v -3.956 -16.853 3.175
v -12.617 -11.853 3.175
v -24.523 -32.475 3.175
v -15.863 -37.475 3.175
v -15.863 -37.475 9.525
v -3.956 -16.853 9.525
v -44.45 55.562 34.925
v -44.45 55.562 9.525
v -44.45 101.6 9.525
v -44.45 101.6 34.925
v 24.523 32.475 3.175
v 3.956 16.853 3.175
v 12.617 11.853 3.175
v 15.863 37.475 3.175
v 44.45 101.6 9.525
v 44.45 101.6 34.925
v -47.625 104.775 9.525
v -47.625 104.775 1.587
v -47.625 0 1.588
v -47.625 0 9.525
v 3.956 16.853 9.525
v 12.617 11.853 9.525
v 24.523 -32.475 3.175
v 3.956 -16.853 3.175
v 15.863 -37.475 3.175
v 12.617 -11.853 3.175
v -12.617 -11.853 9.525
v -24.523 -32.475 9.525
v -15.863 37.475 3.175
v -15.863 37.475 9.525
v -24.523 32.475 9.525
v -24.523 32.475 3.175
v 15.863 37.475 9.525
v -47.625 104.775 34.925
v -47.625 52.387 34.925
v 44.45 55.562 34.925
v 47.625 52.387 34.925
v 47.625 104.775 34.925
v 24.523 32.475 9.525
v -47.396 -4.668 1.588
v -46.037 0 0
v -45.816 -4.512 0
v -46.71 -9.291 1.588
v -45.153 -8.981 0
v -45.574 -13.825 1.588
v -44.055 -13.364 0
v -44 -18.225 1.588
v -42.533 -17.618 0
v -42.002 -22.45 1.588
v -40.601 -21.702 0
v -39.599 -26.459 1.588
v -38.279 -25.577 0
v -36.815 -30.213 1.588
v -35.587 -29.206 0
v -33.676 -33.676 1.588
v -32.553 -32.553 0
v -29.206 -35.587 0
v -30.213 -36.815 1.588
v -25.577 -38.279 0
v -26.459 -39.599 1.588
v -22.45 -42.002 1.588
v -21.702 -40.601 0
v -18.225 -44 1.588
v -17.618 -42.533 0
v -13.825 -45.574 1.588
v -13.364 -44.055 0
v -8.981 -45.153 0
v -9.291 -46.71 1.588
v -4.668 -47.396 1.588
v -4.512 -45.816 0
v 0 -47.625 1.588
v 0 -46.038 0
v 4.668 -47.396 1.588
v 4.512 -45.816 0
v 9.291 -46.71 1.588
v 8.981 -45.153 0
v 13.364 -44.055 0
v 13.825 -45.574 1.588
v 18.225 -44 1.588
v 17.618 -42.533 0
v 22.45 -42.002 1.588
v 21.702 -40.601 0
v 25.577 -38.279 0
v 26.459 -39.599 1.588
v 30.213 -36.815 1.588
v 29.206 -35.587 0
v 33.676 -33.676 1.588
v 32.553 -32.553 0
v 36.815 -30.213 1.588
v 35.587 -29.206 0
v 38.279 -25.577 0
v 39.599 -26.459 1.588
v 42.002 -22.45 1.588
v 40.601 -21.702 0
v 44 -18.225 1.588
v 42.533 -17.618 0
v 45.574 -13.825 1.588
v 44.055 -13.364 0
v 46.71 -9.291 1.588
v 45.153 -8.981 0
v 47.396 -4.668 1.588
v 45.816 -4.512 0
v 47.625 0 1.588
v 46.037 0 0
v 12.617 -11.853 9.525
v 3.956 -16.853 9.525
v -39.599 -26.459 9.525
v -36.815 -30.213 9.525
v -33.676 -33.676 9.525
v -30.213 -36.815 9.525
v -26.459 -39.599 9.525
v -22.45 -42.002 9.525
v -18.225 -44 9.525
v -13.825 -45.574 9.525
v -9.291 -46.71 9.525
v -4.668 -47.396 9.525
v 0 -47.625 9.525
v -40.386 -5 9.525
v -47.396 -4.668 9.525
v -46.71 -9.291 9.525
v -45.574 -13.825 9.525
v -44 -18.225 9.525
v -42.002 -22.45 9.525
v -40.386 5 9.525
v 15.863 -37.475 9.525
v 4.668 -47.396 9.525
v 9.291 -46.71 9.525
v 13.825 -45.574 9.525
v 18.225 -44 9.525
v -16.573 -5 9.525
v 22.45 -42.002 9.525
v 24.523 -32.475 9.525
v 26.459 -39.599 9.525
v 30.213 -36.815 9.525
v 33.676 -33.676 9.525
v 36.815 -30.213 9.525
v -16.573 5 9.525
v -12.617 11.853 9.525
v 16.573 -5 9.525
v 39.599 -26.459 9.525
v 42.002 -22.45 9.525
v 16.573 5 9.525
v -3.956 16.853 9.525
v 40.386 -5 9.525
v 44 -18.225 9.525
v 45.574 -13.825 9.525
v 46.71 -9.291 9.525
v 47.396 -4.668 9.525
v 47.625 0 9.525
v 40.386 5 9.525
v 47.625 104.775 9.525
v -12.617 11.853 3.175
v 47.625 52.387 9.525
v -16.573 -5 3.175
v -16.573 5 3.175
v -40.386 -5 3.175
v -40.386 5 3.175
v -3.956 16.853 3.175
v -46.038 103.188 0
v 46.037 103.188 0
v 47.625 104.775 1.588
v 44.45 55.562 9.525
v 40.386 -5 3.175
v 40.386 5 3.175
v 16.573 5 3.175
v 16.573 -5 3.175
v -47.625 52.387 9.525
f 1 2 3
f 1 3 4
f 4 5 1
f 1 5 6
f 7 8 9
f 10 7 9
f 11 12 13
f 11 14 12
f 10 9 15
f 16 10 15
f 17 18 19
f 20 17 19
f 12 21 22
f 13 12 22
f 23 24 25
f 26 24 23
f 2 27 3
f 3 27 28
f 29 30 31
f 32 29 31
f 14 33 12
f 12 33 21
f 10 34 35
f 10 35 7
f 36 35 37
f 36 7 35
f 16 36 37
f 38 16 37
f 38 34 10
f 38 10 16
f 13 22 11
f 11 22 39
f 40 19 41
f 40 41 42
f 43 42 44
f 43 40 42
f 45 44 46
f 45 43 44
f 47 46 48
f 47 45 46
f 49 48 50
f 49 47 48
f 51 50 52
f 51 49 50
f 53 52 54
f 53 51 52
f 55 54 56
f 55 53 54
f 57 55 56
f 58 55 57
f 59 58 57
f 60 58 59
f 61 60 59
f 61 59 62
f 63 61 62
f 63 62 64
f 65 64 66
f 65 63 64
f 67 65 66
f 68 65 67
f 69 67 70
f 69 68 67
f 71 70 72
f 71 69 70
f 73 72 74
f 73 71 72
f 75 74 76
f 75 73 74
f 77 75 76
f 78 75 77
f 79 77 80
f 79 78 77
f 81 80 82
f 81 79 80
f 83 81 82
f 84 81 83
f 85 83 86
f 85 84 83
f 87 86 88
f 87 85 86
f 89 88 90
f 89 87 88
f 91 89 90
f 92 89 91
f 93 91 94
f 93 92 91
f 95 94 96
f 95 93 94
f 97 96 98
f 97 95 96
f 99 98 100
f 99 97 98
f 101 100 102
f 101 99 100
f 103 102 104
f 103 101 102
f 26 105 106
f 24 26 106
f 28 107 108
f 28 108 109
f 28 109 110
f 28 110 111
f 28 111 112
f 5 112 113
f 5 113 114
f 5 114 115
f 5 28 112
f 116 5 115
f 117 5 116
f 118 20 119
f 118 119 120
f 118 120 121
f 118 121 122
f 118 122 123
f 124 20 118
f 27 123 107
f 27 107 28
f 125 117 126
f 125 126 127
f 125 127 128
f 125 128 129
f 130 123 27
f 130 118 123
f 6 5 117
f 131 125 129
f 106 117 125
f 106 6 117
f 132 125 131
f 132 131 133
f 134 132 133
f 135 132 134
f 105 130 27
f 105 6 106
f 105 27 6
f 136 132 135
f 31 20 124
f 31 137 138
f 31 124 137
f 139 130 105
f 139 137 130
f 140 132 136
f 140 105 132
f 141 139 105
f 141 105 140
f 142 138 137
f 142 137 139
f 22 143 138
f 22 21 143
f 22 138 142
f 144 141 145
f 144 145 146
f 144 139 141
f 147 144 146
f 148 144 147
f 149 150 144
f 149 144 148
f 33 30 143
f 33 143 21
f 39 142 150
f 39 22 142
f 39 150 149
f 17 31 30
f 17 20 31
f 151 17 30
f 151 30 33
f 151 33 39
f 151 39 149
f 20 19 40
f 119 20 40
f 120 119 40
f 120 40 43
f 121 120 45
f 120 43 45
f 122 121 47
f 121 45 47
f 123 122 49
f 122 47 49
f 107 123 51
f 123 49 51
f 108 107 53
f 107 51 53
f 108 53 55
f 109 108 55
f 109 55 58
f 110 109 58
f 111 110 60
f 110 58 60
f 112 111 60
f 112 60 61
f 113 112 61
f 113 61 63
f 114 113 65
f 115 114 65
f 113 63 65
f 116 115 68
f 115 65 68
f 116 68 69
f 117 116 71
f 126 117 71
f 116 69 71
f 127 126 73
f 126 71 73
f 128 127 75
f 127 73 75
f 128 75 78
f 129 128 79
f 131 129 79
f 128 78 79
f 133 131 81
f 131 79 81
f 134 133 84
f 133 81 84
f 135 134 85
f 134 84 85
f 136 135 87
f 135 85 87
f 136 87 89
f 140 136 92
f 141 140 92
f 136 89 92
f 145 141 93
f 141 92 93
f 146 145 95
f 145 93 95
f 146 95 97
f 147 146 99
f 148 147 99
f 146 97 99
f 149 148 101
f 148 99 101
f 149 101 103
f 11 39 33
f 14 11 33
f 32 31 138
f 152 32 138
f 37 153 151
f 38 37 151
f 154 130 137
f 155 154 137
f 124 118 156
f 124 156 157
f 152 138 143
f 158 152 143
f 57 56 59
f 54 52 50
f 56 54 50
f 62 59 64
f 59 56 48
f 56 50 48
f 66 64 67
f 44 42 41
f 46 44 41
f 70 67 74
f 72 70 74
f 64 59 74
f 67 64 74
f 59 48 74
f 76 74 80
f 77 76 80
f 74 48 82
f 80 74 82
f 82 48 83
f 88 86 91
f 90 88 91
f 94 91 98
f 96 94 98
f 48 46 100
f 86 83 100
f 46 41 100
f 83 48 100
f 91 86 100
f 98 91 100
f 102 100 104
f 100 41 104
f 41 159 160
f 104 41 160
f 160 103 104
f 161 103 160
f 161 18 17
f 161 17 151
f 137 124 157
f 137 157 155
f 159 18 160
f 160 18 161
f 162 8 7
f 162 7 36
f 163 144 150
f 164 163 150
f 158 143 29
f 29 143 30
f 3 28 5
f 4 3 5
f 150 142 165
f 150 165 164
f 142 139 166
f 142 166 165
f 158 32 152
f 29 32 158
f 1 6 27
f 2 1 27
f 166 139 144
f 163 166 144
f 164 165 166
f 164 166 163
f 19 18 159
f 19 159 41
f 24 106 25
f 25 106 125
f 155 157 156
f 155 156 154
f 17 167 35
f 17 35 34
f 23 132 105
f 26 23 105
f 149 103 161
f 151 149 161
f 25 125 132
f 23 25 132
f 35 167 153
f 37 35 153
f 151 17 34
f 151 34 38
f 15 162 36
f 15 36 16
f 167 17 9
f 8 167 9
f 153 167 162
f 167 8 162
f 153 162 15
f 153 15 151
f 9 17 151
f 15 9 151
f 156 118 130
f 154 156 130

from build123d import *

# Parameters (mm, degrees)
F0_R     = 12.7
F0_W     = 95.25
F0_H     = 52.3875
F0_W_2   = 88.9
F0_H_2   = 46.0375
F1_DEPTH = 9.525
F2_W     = 95.25
F2_H     = 52.3875
F2_W_2   = 88.9
F2_H_2   = 46.0375
F3_DEPTH = 25.4
F4_W     = 23.8125
F4_H     = 10
F5_DEPTH = 6.35
F6_DEPTH = 9.525
F7_SIZE  = 1.5875


with BuildPart() as f1:
    # F0 (on Top) → F1 (new body)
    with BuildSketch(Plane.XY):
        with BuildLine():
            ThreePointArc((-47.625, 0), (0, -47.625), (47.625, 0))
            ThreePointArc((47.625, 0), (0, 47.625), (-47.625, 0))
        make_face()
        Circle(F0_R, mode=Mode.SUBTRACT)
        with Locations((0, 78.58125)):
            Rectangle(F0_W, F0_H)
        with Locations((0, 78.58125)):
            Rectangle(F0_W_2, F0_H_2, mode=Mode.SUBTRACT)
        with Locations((0, 78.58125)):
            Rectangle(F0_W_2, F0_H_2)
        with BuildLine():
            ThreePointArc((-47.625, 0), (0, 47.625), (47.625, 0))
            Line((47.625, 0), (47.625, 52.3875))
            Line((47.625, 52.3875), (-47.625, 52.3875))
            Line((-47.625, 52.3875), (-47.625, 0))
        make_face()
    extrude(amount=F1_DEPTH)

    # F4 (on face) → F5 (cut)
    with BuildSketch(Plane.XY.offset(9.525)):
        with Locations((-28.4794976622, 0)):
            Rectangle(F4_W, F4_H)
        Polygon((-12.61675085, 11.8528534987), (-3.9564968122, 16.8528534987), (-15.8627468122, 37.4750834263), (-24.52300085, 32.4750834263), align=None)
        Polygon((3.9564968122, 16.8528534987), (12.61675085, 11.8528534987), (24.52300085, 32.4750834263), (15.8627468122, 37.4750834263), align=None)
        with Locations((28.4794976622, 0)):
            Rectangle(F4_W, F4_H)
        Polygon((12.61675085, -11.8528534987), (3.9564968122, -16.8528534987), (15.8627468122, -37.4750834263), (24.52300085, -32.4750834263), align=None)
        Polygon((-3.9564968122, -16.8528534987), (-12.61675085, -11.8528534987), (-24.52300085, -32.4750834263), (-15.8627468122, -37.4750834263), align=None)
    extrude(amount=-F5_DEPTH, mode=Mode.SUBTRACT)

    # F0 (on Top) → F6 (join, through all)
    with BuildSketch(Plane.XY):
        Circle(F0_R)
    extrude(amount=F6_DEPTH)

    # F7
    f7_edges = [f1.edges().sort_by_distance(p)[0] for p in [
        (0, -47.625, 0),
        (0, 104.775, 0),
    ]]
    chamfer(f7_edges, length=F7_SIZE)


with BuildPart() as f3:
    # F2 (on face) → F3 (new body)
    with BuildSketch(Plane.XY.offset(9.525)):
        with Locations((0, 78.58125)):
            Rectangle(F2_W, F2_H)
        with Locations((0, 78.58125)):
            Rectangle(F2_W_2, F2_H_2, mode=Mode.SUBTRACT)
    extrude(amount=F3_DEPTH)


solid = Compound([f1.part, f3.part])
